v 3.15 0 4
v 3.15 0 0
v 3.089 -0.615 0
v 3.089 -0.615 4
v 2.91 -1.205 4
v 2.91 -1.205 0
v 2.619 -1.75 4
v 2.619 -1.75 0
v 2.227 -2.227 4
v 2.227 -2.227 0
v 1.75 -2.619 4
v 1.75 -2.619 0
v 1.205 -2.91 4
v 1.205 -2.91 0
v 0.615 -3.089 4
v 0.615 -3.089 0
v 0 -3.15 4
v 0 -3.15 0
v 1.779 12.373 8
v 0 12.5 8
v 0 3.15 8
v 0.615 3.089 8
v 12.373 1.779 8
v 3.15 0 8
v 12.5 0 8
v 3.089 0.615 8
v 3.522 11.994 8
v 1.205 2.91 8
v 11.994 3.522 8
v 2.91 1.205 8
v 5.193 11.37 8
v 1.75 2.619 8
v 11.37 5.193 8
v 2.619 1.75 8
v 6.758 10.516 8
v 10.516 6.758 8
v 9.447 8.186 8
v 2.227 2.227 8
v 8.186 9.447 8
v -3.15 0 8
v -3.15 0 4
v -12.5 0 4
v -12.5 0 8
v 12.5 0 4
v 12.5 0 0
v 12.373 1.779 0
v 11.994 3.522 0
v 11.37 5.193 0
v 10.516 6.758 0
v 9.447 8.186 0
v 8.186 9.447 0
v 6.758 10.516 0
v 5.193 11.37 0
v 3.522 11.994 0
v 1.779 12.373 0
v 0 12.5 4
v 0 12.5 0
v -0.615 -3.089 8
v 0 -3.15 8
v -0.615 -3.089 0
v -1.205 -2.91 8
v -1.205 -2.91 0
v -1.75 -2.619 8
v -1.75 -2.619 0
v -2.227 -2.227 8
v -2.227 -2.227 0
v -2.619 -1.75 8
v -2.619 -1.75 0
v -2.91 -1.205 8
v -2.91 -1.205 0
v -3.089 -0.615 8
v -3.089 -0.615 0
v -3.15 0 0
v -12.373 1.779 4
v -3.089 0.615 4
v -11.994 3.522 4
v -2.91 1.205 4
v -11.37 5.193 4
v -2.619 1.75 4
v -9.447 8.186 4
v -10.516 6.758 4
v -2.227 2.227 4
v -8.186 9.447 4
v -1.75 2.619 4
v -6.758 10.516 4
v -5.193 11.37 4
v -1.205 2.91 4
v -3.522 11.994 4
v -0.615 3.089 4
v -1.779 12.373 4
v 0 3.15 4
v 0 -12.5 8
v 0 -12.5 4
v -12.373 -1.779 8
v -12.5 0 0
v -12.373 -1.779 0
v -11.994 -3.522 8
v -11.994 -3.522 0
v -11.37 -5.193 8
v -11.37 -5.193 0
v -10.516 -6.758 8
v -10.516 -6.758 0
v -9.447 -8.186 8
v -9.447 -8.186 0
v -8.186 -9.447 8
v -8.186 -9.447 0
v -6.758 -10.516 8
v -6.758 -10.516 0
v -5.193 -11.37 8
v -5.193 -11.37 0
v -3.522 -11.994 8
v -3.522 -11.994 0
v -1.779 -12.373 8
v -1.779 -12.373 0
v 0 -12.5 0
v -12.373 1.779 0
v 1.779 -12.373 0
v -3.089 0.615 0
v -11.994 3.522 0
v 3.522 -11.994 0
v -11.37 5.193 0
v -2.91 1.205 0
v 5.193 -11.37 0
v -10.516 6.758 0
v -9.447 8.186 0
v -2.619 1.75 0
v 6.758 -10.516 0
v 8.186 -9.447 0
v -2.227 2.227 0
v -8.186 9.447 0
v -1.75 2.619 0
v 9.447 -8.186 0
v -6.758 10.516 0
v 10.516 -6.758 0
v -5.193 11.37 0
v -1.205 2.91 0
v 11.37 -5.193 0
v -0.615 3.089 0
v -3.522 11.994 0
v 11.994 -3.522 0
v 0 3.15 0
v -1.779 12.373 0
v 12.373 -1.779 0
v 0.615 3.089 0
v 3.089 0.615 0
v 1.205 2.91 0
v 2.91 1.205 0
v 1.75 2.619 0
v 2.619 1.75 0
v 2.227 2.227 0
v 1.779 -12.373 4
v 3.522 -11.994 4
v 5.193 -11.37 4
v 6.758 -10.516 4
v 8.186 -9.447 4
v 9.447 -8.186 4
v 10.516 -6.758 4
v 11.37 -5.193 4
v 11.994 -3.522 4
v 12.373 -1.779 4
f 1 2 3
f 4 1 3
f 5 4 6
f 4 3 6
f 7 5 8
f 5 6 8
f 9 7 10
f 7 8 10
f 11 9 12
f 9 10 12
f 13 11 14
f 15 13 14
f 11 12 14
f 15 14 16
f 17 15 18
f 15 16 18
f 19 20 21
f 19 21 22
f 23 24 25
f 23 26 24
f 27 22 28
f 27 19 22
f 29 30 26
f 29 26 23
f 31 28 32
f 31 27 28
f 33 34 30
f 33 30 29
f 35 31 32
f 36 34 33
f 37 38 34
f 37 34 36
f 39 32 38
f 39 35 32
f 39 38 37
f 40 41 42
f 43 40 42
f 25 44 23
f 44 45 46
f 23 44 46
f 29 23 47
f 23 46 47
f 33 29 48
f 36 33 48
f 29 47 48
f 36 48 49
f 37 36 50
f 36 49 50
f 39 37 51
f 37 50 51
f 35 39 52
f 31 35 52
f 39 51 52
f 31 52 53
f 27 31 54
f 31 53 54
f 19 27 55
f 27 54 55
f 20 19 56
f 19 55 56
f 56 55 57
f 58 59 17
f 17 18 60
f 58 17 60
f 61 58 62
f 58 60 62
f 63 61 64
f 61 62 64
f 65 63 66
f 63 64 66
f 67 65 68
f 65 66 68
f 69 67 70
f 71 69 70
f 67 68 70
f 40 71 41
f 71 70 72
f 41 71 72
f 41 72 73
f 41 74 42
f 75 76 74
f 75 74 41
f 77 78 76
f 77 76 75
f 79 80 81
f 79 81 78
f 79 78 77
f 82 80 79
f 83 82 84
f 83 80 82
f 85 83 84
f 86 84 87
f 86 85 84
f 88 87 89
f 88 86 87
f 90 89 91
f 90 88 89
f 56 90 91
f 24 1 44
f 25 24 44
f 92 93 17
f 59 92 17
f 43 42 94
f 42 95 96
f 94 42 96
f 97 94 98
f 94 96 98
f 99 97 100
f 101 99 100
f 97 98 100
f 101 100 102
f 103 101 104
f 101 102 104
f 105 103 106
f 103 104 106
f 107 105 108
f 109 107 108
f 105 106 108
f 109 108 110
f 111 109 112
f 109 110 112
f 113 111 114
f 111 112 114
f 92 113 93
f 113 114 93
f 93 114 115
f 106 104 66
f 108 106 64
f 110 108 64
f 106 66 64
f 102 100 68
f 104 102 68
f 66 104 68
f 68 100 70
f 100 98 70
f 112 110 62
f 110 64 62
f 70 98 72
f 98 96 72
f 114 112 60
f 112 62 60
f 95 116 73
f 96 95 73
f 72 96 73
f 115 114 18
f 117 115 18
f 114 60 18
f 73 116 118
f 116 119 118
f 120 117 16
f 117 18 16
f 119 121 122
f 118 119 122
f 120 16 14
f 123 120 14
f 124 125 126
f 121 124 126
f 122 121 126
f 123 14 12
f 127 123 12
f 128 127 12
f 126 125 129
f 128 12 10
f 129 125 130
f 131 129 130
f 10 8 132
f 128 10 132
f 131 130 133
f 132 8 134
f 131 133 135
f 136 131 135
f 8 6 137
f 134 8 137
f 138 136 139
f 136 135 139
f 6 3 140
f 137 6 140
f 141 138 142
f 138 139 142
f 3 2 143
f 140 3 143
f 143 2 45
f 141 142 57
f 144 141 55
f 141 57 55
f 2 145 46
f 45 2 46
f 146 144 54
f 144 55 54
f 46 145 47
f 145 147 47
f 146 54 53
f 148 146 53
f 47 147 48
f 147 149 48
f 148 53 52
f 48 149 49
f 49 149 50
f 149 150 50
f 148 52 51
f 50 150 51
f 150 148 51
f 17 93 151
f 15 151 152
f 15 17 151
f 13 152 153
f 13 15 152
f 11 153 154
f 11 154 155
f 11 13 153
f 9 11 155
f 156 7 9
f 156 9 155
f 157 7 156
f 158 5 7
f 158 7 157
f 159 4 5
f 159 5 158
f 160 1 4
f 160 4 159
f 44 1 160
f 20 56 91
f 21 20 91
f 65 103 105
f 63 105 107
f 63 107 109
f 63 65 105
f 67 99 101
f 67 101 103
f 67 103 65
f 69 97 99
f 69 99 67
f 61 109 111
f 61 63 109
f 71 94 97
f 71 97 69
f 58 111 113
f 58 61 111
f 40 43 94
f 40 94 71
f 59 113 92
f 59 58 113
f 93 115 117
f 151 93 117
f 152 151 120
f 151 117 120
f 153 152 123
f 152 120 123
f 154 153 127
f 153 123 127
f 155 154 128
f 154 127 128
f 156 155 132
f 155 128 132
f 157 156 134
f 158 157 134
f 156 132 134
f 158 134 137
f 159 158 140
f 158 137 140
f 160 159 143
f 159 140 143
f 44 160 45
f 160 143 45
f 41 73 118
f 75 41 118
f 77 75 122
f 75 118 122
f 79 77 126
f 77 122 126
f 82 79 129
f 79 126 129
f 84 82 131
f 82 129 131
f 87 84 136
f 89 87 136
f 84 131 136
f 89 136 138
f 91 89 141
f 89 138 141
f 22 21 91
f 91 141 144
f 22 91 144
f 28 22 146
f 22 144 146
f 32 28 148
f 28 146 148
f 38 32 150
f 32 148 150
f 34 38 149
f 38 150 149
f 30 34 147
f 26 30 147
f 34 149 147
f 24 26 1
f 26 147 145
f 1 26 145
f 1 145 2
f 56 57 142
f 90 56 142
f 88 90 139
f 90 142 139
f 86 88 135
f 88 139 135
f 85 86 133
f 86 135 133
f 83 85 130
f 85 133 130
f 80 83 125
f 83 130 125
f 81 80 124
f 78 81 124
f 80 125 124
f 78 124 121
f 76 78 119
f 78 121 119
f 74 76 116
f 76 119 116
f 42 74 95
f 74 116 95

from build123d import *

# Parameters (mm, degrees)
F1_DEPTH = 4
F2_DEPTH = 8


with BuildPart() as f1:
    # F0 (on Top) → F1 (new body)
    with BuildSketch(Plane.XY):
        with BuildLine():
            ThreePointArc((-12.5, 0), (-8.838835, -8.838835), (0, -12.5))
            Line((0, -12.5), (0, -3.15))
            ThreePointArc((0, -3.15), (-2.227386, -2.227386), (-3.15, 0))
            Line((-3.15, 0), (-12.5, 0))
        make_face()
        with BuildLine():
            Line((0, 3.15), (0, 12.5))
            ThreePointArc((0, 12.5), (-8.838835, 8.838835), (-12.5, 0))
            Line((-12.5, 0), (-3.15, 0))
            ThreePointArc((-3.15, 0), (-2.227386, 2.227386), (0, 3.15))
        make_face()
        with BuildLine():
            Line((3.15, 0), (12.5, 0))
            ThreePointArc((12.5, 0), (8.838835, 8.838835), (0, 12.5))
            Line((0, 12.5), (0, 3.15))
            ThreePointArc((0, 3.15), (2.227386, 2.227386), (3.15, 0))
        make_face()
        with BuildLine():
            ThreePointArc((0, -12.5), (8.838835, -8.838835), (12.5, 0))
            Line((12.5, 0), (3.15, 0))
            ThreePointArc((3.15, 0), (2.227386, -2.227386), (0, -3.15))
            Line((0, -3.15), (0, -12.5))
        make_face()
    extrude(amount=F1_DEPTH)

    # F0 (on Top) → F2 (join)
    with BuildSketch(Plane.XY):
        with BuildLine():
            Line((3.15, 0), (12.5, 0))
            ThreePointArc((12.5, 0), (8.838835, 8.838835), (0, 12.5))
            Line((0, 12.5), (0, 3.15))
            ThreePointArc((0, 3.15), (2.227386, 2.227386), (3.15, 0))
        make_face()
        with BuildLine():
            ThreePointArc((-12.5, 0), (-8.838835, -8.838835), (0, -12.5))
            Line((0, -12.5), (0, -3.15))
            ThreePointArc((0, -3.15), (-2.227386, -2.227386), (-3.15, 0))
            Line((-3.15, 0), (-12.5, 0))
        make_face()
    extrude(amount=F2_DEPTH)


solid = f1.part
